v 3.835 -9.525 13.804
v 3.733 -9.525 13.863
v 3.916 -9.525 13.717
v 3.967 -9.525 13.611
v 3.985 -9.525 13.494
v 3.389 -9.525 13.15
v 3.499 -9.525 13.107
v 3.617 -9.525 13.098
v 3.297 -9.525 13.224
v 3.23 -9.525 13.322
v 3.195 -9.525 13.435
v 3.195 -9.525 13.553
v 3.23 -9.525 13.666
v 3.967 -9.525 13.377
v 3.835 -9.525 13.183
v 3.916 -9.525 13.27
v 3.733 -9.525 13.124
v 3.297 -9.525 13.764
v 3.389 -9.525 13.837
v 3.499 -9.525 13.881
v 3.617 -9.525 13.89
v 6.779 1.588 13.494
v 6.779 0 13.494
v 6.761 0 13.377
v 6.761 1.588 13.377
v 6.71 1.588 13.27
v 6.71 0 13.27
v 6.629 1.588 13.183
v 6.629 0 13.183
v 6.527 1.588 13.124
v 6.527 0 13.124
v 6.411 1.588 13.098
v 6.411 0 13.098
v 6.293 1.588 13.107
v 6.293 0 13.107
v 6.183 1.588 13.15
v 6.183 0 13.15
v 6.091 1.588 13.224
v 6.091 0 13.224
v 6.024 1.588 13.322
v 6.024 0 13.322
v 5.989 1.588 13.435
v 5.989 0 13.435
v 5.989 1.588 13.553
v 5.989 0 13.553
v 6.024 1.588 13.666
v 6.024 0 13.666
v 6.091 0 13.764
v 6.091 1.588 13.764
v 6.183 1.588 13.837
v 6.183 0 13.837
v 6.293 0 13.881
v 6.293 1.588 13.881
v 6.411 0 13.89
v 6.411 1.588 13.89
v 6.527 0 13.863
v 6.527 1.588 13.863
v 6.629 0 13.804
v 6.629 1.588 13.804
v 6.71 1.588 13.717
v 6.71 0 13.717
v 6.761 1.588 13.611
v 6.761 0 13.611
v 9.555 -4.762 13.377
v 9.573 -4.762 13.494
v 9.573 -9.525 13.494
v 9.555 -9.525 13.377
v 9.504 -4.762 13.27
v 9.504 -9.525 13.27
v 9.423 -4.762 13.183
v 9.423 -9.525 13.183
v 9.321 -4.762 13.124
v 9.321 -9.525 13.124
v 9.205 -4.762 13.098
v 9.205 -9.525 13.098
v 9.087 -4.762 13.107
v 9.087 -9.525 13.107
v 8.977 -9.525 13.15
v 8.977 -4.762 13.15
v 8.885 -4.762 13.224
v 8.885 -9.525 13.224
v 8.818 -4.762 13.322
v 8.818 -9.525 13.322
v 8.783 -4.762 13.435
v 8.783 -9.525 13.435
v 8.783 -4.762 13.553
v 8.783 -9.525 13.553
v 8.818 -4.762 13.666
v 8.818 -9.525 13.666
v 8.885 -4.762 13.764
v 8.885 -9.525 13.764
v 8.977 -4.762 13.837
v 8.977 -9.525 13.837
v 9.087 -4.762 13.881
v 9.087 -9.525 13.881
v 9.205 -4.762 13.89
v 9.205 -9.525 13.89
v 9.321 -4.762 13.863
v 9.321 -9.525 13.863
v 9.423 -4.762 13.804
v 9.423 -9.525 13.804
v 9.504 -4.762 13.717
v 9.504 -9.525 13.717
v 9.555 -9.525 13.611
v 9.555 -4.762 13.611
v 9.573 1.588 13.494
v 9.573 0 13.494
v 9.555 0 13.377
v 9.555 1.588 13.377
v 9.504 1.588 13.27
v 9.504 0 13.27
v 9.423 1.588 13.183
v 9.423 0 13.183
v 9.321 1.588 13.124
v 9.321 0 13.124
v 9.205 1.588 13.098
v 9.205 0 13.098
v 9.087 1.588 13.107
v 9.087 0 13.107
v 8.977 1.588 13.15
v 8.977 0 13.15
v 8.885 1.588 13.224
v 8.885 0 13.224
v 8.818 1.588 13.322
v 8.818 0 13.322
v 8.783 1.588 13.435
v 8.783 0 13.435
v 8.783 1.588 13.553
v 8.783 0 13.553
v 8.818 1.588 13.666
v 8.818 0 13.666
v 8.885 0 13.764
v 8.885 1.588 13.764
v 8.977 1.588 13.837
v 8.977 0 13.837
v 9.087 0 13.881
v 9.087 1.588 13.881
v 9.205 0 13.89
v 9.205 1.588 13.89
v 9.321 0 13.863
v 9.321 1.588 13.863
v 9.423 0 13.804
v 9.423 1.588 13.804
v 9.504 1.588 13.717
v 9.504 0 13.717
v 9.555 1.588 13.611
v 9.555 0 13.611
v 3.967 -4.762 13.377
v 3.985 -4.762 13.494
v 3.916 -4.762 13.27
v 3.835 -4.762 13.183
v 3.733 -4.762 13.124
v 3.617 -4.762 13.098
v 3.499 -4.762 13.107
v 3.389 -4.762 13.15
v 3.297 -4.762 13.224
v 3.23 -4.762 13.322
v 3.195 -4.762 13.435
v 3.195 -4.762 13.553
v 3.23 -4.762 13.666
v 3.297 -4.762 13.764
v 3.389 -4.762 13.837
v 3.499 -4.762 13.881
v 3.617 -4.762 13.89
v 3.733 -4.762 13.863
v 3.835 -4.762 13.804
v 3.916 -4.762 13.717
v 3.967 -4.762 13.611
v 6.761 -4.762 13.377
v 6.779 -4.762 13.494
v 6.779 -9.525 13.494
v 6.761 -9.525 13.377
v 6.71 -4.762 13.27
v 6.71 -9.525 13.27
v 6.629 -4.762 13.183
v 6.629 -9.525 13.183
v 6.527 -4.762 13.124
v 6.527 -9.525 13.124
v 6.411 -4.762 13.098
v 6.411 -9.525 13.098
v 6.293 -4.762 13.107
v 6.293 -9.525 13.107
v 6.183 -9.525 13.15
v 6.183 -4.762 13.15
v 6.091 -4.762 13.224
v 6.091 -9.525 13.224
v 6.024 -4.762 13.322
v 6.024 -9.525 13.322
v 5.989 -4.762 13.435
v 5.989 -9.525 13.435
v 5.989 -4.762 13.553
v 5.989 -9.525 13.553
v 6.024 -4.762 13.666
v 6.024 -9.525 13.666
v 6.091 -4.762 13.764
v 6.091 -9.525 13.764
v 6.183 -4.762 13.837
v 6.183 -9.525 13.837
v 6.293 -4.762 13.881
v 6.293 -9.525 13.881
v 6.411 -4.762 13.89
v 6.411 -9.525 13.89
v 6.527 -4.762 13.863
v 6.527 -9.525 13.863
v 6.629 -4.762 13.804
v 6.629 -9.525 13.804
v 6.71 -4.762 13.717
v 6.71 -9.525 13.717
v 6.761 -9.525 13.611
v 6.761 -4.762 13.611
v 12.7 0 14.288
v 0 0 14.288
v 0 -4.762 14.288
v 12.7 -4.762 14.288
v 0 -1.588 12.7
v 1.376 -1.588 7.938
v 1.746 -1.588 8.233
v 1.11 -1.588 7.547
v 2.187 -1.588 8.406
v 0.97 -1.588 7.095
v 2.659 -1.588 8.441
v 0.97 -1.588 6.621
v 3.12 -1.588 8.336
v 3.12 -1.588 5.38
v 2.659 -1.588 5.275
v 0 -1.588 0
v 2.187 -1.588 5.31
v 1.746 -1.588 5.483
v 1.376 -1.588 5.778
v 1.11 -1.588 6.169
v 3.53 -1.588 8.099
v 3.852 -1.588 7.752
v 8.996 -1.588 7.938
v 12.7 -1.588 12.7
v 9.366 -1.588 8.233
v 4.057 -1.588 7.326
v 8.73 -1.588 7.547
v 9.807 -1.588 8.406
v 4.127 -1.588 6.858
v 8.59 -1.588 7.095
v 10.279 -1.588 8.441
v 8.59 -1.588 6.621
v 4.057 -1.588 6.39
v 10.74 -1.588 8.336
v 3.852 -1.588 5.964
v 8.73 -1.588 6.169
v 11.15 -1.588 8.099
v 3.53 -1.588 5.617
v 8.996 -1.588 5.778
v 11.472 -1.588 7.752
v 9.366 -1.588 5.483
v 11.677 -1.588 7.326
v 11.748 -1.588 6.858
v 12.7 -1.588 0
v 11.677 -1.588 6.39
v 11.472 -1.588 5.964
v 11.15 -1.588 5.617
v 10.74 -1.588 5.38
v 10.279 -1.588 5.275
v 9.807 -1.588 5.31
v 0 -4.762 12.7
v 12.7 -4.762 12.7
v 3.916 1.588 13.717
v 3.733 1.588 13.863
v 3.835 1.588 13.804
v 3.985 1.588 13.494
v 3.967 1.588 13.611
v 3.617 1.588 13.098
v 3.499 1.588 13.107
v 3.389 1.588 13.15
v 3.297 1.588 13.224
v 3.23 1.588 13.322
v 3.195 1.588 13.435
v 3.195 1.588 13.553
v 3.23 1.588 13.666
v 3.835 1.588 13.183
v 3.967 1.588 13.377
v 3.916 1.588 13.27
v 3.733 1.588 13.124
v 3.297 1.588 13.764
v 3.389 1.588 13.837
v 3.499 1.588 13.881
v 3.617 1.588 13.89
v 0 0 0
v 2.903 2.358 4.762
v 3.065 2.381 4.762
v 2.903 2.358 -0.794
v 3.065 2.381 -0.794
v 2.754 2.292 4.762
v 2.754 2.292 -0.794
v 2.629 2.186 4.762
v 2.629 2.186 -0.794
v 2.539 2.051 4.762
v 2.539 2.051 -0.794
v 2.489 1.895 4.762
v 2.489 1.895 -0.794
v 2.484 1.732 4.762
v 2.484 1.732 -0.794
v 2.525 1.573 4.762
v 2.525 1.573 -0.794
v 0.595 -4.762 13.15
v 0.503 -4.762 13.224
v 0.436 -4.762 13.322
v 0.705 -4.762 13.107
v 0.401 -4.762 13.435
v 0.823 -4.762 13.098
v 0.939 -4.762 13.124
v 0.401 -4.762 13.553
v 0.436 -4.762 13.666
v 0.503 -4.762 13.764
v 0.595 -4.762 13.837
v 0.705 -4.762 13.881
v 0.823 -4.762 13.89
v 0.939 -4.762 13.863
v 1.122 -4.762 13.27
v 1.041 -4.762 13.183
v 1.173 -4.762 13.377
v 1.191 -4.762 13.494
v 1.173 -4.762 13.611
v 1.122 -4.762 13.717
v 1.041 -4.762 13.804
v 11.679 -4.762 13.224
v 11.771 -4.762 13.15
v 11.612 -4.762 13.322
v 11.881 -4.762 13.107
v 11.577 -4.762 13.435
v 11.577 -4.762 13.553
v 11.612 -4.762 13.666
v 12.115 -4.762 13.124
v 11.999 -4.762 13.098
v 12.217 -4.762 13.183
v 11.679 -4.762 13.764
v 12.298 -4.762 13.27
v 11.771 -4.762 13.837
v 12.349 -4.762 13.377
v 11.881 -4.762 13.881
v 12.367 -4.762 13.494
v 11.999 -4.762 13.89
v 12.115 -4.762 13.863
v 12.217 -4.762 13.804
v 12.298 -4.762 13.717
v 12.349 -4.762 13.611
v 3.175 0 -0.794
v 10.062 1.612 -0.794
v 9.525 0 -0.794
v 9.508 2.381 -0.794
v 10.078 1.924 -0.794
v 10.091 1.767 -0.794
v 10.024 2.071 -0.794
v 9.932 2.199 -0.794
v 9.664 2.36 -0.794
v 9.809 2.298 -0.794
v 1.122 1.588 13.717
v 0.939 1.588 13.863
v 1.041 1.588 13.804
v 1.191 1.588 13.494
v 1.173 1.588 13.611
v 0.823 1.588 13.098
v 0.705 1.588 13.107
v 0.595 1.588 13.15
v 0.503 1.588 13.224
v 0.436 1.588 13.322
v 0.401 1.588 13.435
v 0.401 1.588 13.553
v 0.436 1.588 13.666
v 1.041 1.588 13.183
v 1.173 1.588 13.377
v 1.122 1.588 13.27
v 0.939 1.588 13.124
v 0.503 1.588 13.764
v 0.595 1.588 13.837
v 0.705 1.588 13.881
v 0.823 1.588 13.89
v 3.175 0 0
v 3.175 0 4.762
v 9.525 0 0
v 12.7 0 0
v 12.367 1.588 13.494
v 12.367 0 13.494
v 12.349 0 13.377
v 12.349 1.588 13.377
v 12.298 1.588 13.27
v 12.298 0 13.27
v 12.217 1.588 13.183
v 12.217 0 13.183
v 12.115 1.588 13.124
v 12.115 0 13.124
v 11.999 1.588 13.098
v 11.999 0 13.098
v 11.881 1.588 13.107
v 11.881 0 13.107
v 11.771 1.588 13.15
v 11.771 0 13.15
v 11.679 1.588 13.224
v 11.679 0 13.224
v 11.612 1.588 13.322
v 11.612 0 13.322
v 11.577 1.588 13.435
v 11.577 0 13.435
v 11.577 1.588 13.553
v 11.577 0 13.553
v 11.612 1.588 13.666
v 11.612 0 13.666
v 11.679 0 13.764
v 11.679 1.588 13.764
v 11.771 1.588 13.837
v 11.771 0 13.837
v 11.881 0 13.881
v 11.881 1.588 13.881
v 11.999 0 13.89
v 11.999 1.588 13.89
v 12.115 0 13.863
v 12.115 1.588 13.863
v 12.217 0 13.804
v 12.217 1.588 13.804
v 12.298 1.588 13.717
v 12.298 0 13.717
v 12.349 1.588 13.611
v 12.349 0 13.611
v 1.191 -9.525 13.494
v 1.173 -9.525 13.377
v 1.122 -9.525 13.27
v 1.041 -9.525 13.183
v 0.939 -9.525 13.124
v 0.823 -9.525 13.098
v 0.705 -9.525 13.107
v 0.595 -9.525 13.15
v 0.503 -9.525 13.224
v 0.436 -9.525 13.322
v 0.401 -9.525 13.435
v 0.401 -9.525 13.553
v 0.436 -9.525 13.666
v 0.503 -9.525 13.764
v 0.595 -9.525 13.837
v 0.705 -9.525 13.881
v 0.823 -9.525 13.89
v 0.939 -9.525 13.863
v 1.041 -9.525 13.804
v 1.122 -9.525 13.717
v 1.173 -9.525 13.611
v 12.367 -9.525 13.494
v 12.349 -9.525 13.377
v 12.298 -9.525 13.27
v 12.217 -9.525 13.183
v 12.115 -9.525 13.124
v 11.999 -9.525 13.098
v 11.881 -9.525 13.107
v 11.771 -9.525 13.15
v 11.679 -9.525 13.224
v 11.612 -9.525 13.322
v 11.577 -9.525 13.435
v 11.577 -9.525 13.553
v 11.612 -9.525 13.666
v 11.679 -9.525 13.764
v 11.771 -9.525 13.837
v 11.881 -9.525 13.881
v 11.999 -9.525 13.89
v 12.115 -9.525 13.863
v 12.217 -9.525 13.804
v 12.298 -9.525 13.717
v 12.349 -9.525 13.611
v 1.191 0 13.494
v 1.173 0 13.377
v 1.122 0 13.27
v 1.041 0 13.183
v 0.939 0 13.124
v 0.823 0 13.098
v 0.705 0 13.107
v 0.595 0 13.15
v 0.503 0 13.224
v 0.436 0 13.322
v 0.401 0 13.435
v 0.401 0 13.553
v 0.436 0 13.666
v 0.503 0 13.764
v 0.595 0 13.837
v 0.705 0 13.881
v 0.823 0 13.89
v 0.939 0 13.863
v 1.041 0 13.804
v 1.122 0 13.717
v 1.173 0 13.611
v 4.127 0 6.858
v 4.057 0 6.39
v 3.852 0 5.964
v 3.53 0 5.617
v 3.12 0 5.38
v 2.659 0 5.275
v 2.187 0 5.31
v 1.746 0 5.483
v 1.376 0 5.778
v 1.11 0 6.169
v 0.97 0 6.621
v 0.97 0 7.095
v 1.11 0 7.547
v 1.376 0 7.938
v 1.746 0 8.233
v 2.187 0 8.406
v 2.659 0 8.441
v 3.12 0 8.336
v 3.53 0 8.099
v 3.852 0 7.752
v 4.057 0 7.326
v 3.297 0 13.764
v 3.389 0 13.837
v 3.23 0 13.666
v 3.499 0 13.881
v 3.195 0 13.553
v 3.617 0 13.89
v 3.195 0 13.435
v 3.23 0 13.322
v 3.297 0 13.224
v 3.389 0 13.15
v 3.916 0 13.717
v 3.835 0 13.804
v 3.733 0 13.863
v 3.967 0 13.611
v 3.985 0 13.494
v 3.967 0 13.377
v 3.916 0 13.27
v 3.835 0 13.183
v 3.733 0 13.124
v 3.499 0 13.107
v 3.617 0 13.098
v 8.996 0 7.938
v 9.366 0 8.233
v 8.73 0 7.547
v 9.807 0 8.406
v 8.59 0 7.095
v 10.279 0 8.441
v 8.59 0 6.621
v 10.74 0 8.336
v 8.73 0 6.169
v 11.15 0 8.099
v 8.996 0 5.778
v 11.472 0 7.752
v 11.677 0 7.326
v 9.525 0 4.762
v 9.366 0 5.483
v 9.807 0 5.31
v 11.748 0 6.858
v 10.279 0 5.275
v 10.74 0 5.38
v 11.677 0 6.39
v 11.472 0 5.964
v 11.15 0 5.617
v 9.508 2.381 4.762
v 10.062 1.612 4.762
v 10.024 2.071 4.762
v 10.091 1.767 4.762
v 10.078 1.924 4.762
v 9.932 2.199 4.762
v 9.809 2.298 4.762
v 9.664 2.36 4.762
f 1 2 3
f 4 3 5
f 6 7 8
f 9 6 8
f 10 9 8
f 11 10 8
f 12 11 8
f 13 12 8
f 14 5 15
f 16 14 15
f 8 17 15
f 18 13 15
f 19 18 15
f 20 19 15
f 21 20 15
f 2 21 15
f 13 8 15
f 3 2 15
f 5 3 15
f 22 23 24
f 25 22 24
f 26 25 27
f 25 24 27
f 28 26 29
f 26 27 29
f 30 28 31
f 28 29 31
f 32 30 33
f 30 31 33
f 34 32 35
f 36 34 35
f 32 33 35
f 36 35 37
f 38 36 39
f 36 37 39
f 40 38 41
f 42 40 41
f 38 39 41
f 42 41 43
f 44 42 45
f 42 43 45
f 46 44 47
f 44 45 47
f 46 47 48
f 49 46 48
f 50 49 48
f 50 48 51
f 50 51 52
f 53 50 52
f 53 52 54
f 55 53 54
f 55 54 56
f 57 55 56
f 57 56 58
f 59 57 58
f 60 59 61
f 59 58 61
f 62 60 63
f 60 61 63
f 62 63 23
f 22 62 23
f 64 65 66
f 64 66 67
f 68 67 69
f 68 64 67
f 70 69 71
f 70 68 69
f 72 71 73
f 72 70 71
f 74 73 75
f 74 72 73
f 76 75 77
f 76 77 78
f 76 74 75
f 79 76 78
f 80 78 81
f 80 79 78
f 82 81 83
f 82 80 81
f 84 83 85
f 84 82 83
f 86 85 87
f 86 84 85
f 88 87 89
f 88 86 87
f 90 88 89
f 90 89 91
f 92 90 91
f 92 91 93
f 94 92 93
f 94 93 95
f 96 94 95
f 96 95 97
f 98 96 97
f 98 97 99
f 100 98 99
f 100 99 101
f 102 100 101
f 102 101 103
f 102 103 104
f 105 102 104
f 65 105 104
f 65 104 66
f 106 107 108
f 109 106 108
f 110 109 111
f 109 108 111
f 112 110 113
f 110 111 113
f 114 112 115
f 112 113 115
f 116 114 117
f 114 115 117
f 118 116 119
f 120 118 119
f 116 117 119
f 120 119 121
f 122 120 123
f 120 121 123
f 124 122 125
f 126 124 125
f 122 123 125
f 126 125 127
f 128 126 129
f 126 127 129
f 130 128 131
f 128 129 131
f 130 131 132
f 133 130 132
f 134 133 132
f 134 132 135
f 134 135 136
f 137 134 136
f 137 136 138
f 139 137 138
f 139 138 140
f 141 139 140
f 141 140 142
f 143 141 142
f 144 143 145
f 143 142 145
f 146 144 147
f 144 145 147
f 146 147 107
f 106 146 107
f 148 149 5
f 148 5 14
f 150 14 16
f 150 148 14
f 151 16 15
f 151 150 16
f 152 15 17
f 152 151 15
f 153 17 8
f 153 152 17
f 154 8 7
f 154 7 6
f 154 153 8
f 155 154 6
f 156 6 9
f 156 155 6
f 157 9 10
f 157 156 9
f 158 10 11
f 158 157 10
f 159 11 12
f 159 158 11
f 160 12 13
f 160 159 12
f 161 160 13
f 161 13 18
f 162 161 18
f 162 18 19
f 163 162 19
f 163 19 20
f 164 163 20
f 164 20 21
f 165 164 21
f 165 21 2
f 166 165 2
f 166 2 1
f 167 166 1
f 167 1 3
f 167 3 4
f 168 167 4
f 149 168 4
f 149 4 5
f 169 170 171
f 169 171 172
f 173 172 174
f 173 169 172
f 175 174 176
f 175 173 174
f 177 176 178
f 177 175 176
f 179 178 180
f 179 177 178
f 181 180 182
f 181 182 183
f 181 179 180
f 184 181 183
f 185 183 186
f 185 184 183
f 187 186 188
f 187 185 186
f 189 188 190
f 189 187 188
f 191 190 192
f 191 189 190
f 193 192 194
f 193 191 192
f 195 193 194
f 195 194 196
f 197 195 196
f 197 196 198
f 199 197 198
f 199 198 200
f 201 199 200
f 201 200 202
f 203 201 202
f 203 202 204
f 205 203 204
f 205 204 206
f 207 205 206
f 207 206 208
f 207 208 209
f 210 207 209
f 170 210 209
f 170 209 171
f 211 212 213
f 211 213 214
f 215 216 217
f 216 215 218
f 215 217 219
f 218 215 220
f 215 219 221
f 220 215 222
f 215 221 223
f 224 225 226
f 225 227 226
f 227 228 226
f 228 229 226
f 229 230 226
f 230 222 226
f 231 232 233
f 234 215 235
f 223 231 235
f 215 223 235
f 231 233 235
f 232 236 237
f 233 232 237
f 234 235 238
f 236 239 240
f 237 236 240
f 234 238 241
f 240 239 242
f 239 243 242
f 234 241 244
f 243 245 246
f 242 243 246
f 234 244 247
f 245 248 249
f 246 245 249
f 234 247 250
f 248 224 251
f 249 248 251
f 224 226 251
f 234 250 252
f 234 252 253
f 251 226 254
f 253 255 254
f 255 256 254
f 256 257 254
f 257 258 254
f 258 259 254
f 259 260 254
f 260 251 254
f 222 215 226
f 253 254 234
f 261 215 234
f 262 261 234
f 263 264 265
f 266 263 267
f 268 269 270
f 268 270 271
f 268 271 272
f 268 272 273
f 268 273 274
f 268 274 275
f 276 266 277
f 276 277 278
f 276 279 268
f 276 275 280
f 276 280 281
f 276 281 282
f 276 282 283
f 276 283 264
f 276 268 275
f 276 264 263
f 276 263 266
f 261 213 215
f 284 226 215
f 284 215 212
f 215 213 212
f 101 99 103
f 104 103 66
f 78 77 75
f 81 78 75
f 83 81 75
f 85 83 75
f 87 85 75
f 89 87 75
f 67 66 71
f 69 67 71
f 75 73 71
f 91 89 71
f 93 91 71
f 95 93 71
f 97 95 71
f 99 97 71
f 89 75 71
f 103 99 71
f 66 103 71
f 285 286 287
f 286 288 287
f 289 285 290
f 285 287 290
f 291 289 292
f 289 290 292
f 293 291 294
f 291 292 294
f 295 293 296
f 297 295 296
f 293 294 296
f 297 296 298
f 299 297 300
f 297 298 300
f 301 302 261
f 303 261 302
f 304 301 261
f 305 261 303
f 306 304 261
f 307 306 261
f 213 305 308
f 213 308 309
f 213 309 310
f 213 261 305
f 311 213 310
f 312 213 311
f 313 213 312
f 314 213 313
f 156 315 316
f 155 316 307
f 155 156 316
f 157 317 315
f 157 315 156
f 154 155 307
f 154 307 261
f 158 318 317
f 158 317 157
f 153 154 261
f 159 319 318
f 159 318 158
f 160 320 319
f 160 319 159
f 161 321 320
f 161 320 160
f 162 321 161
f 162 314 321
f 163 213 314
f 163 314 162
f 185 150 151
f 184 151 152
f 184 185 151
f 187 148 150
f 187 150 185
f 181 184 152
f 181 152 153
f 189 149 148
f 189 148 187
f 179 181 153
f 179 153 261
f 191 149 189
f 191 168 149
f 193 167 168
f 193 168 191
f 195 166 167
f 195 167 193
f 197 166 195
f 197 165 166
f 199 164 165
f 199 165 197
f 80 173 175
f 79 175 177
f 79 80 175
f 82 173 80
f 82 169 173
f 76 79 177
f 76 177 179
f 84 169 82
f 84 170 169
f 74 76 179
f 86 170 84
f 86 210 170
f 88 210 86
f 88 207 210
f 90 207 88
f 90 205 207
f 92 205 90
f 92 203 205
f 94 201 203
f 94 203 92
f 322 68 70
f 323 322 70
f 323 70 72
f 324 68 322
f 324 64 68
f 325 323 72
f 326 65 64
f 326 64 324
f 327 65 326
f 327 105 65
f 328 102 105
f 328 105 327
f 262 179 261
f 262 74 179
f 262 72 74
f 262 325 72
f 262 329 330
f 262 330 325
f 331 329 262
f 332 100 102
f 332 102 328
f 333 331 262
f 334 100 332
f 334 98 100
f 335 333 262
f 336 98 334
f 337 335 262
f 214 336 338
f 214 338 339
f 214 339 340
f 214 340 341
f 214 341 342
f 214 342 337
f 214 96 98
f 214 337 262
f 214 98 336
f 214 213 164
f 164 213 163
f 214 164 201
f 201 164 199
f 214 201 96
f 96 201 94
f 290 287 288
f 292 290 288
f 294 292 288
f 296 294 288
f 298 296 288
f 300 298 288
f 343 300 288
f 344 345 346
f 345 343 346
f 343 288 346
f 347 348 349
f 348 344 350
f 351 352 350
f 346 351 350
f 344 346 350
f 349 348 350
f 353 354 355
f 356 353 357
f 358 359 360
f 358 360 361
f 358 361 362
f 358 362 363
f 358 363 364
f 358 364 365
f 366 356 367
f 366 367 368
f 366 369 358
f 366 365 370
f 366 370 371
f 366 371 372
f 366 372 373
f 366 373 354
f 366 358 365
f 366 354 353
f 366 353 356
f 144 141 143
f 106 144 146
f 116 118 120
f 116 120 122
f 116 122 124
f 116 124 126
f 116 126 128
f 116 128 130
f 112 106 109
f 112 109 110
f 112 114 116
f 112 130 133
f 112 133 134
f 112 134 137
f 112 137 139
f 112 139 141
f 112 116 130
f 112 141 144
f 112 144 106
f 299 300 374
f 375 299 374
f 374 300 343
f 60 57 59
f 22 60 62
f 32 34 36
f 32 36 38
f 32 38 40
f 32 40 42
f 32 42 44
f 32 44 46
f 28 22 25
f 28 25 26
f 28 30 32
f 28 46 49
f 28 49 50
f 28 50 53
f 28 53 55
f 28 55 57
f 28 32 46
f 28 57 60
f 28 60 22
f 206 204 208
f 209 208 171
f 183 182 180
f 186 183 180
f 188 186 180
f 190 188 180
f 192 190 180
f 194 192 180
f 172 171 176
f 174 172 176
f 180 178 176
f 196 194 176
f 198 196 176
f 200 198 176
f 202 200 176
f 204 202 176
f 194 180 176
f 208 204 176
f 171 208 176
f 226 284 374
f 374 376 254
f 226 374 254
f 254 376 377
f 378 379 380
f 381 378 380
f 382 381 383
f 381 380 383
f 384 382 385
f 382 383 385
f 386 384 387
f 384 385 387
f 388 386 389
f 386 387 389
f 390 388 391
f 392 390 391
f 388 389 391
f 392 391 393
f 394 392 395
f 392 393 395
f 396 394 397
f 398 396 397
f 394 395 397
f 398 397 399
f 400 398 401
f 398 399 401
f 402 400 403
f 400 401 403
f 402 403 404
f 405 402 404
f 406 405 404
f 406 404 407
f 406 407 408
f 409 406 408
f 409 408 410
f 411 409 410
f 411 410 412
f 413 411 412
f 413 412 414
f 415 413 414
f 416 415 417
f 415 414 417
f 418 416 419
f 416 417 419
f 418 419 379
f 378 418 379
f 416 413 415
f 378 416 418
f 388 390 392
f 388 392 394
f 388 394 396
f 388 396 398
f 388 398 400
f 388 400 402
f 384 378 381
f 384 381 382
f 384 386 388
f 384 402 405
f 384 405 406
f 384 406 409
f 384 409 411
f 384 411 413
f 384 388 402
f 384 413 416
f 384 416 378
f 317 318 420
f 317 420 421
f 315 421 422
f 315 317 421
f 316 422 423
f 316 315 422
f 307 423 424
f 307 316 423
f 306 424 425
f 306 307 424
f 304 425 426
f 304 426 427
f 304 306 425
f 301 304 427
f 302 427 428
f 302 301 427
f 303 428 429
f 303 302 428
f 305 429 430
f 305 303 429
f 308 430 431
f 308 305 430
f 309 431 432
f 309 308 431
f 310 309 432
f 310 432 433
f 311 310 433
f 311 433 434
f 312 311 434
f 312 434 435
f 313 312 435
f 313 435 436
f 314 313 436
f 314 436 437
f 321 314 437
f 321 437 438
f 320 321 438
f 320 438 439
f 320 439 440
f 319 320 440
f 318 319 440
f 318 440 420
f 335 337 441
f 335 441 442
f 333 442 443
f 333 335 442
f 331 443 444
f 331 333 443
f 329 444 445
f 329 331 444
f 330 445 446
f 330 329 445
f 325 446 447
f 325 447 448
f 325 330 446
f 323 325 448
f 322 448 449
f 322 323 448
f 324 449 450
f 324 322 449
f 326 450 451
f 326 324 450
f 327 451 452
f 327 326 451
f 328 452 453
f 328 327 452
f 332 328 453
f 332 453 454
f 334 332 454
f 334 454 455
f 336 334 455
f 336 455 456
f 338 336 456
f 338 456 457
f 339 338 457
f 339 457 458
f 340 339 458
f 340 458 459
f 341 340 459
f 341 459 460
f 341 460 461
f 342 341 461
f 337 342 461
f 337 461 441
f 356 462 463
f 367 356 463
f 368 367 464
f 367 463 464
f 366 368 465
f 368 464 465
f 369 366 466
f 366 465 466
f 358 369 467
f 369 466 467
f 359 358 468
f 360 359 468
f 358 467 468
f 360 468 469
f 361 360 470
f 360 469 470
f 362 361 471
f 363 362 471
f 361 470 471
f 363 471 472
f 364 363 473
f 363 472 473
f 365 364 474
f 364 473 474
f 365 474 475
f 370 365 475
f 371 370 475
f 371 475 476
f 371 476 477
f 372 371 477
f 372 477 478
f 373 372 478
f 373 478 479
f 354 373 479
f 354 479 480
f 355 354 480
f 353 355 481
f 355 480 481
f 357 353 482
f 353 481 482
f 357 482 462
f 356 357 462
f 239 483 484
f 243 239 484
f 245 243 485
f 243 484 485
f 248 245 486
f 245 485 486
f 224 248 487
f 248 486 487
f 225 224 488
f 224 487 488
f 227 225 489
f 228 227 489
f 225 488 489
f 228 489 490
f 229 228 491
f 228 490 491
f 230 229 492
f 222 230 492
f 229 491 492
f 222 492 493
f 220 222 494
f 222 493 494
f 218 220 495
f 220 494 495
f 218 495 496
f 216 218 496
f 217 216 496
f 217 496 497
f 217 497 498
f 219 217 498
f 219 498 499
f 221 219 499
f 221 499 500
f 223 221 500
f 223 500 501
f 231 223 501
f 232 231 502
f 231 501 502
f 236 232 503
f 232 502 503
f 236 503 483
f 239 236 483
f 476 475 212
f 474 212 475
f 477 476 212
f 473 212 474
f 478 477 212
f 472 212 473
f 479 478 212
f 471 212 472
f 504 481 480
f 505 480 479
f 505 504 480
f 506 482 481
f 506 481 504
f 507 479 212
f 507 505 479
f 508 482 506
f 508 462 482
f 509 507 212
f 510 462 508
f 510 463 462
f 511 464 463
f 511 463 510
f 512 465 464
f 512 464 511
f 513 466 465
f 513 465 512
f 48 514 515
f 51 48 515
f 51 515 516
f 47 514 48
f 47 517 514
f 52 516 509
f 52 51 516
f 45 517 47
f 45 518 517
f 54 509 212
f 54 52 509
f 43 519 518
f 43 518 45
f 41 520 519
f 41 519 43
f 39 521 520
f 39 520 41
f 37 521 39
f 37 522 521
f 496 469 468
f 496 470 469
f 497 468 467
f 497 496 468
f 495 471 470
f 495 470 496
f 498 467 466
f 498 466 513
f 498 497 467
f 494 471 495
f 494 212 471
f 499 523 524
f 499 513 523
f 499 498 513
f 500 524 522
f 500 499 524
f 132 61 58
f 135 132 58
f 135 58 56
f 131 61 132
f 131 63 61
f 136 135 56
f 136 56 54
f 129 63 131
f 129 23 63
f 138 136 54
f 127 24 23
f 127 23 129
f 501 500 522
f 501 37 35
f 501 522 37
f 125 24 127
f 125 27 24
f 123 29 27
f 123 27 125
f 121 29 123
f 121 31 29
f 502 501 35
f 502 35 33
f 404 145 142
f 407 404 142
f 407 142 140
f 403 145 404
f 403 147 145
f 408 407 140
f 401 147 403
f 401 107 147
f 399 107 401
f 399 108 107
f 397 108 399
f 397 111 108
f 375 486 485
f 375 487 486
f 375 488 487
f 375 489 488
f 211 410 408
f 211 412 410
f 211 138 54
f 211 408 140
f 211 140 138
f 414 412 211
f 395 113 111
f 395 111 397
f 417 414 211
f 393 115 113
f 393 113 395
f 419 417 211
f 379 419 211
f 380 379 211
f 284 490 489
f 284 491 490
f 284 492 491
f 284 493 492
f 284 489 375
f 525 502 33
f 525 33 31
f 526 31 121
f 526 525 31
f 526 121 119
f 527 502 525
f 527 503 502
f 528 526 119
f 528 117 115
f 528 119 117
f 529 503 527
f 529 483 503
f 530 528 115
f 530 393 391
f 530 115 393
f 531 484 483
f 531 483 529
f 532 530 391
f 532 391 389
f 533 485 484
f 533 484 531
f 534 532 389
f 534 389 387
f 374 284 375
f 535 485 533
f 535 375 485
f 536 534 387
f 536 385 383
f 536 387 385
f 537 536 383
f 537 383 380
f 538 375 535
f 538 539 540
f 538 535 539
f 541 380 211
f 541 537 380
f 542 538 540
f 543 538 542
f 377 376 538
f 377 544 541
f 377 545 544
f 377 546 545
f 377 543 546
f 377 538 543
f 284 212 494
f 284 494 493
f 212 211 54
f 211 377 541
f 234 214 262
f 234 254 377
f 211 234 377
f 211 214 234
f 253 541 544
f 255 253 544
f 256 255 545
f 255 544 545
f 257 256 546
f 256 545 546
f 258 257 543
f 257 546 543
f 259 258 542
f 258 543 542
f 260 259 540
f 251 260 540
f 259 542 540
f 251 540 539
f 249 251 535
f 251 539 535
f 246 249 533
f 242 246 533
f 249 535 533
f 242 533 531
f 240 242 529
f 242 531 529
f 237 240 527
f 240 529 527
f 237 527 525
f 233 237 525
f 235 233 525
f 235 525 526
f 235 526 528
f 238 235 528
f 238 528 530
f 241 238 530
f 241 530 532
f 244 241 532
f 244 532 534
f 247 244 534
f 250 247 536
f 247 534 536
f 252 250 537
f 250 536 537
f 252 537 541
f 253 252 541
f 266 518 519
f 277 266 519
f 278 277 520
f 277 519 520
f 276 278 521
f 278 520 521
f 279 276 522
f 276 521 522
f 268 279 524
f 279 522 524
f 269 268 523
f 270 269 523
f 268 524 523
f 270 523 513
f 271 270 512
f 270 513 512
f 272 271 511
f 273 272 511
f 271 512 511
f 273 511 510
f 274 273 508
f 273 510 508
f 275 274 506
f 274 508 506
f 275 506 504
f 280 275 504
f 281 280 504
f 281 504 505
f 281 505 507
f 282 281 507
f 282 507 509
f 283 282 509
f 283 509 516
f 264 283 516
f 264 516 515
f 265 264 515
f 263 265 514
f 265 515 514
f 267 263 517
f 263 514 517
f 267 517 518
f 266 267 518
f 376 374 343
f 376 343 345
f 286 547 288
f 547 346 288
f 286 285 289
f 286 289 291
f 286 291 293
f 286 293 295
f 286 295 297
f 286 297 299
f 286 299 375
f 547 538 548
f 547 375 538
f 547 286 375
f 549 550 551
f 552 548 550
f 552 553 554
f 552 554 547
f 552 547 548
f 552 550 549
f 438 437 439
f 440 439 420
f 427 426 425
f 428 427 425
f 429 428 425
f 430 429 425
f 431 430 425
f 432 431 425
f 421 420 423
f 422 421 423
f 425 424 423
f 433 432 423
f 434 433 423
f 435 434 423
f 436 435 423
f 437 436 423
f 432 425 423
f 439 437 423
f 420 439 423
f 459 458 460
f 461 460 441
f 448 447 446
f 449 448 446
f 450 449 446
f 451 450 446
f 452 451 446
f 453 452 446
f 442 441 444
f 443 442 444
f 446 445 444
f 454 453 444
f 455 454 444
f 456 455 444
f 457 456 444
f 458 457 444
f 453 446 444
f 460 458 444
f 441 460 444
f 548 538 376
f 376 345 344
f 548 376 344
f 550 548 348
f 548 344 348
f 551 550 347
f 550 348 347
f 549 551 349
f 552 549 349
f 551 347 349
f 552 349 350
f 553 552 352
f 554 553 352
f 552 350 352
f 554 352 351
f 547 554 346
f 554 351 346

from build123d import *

# Parameters (mm, degrees)
SKETCH1_W                = 12.7
SKETCH1_H                = 14.2875
SKETCH1_R                = 1.5875
BOSS_EXTRUDE1_DEPTH      = 1.5875
SKETCH2_W                = 12.7
SKETCH2_H                = 3.175
BOSS_EXTRUDE2_DEPTH      = 1.5875
SKETCH3_R                = 0.396875
CUT_EXTRUDE1_DEPTH       = 5.7625
SKETCH4_R                = 0.396875
BOSS_EXTRUDE3_DEPTH      = 1.5875
BOSS_EXTRUDE3_DEPTH_BACK = 9.525
BOSS_EXTRUDE5_DEPTH      = 0.79375
BOSS_EXTRUDE5_DEPTH_BACK = 4.7625


with BuildPart() as part:
    # Sketch1 → Boss-Extrude1 (new body)
    with BuildSketch(Plane(origin=(0, 0, 0), x_dir=(1, 0, 0), z_dir=(0, 1, 0))):
        with Locations((6.35, -7.14375)):
            Rectangle(SKETCH1_W, SKETCH1_H)
        with Locations((10.16, -6.858)):
            Circle(SKETCH1_R, mode=Mode.SUBTRACT)
        with Locations((2.54, -6.858)):
            Circle(SKETCH1_R, mode=Mode.SUBTRACT)
    extrude(amount=-BOSS_EXTRUDE1_DEPTH)

    # Sketch2 → Boss-Extrude2 (add)
    with BuildSketch(Plane.XY.offset(14.2875)):
        with Locations((6.35, -3.175)):
            Rectangle(SKETCH2_W, SKETCH2_H)
    extrude(amount=-BOSS_EXTRUDE2_DEPTH)

    # Sketch3 → Cut-Extrude1 (cut, through all)
    with BuildSketch(Plane(origin=(0, 0, 0), x_dir=(1, 0, 0), z_dir=(0, 1, 0))):
        with Locations((0.79375, -13.49375)):
            Circle(SKETCH3_R)
        with Locations((3.58775, -13.49375)):
            Circle(SKETCH3_R)
        with Locations((6.38175, -13.49375)):
            Circle(SKETCH3_R)
        with Locations((9.17575, -13.49375)):
            Circle(SKETCH3_R)
        with Locations((11.96975, -13.49375)):
            Circle(SKETCH3_R)
    extrude(amount=-CUT_EXTRUDE1_DEPTH, mode=Mode.SUBTRACT)

    # Sketch4 → Boss-Extrude3 (add, two sides)
    with BuildSketch(Plane(origin=(0, 0, 0), x_dir=(1, 0, 0), z_dir=(0, 1, 0))) as boss_extrude3_sk:
        with Locations((0.79375, -13.49375)):
            Circle(SKETCH4_R)
        with Locations((3.58775, -13.49375)):
            Circle(SKETCH4_R)
        with Locations((6.38175, -13.49375)):
            Circle(SKETCH4_R)
        with Locations((9.17575, -13.49375)):
            Circle(SKETCH4_R)
        with Locations((11.96975, -13.49375)):
            Circle(SKETCH4_R)
    extrude(amount=BOSS_EXTRUDE3_DEPTH)
    extrude(boss_extrude3_sk.sketch, amount=-BOSS_EXTRUDE3_DEPTH_BACK)

    # Sketch5 → Boss-Extrude5 (add, two sides)
    with BuildSketch(Plane(origin=(0, 0, 0), x_dir=(-1, 0, 0), z_dir=(0, 0, -1))) as boss_extrude5_sk:
        with BuildLine():
            Line((-9.525, 0), (-10.062267539, 1.611802618))
            ThreePointArc((-10.062267539, 1.611802618), (-9.981921487, 2.138477744), (-9.507681244, 2.38125))
            Line((-9.507681244, 2.38125), (-3.065174491, 2.38125))
            ThreePointArc((-3.065174491, 2.38125), (-2.579253026, 2.12165746), (-2.524890791, 1.573430586))
            Line((-2.524890791, 1.573430586), (-3.175, 0))
            Line((-3.175, 0), (-9.525, 0))
        make_face()
    extrude(amount=BOSS_EXTRUDE5_DEPTH)
    extrude(boss_extrude5_sk.sketch, amount=-BOSS_EXTRUDE5_DEPTH_BACK)


solid = part.part
